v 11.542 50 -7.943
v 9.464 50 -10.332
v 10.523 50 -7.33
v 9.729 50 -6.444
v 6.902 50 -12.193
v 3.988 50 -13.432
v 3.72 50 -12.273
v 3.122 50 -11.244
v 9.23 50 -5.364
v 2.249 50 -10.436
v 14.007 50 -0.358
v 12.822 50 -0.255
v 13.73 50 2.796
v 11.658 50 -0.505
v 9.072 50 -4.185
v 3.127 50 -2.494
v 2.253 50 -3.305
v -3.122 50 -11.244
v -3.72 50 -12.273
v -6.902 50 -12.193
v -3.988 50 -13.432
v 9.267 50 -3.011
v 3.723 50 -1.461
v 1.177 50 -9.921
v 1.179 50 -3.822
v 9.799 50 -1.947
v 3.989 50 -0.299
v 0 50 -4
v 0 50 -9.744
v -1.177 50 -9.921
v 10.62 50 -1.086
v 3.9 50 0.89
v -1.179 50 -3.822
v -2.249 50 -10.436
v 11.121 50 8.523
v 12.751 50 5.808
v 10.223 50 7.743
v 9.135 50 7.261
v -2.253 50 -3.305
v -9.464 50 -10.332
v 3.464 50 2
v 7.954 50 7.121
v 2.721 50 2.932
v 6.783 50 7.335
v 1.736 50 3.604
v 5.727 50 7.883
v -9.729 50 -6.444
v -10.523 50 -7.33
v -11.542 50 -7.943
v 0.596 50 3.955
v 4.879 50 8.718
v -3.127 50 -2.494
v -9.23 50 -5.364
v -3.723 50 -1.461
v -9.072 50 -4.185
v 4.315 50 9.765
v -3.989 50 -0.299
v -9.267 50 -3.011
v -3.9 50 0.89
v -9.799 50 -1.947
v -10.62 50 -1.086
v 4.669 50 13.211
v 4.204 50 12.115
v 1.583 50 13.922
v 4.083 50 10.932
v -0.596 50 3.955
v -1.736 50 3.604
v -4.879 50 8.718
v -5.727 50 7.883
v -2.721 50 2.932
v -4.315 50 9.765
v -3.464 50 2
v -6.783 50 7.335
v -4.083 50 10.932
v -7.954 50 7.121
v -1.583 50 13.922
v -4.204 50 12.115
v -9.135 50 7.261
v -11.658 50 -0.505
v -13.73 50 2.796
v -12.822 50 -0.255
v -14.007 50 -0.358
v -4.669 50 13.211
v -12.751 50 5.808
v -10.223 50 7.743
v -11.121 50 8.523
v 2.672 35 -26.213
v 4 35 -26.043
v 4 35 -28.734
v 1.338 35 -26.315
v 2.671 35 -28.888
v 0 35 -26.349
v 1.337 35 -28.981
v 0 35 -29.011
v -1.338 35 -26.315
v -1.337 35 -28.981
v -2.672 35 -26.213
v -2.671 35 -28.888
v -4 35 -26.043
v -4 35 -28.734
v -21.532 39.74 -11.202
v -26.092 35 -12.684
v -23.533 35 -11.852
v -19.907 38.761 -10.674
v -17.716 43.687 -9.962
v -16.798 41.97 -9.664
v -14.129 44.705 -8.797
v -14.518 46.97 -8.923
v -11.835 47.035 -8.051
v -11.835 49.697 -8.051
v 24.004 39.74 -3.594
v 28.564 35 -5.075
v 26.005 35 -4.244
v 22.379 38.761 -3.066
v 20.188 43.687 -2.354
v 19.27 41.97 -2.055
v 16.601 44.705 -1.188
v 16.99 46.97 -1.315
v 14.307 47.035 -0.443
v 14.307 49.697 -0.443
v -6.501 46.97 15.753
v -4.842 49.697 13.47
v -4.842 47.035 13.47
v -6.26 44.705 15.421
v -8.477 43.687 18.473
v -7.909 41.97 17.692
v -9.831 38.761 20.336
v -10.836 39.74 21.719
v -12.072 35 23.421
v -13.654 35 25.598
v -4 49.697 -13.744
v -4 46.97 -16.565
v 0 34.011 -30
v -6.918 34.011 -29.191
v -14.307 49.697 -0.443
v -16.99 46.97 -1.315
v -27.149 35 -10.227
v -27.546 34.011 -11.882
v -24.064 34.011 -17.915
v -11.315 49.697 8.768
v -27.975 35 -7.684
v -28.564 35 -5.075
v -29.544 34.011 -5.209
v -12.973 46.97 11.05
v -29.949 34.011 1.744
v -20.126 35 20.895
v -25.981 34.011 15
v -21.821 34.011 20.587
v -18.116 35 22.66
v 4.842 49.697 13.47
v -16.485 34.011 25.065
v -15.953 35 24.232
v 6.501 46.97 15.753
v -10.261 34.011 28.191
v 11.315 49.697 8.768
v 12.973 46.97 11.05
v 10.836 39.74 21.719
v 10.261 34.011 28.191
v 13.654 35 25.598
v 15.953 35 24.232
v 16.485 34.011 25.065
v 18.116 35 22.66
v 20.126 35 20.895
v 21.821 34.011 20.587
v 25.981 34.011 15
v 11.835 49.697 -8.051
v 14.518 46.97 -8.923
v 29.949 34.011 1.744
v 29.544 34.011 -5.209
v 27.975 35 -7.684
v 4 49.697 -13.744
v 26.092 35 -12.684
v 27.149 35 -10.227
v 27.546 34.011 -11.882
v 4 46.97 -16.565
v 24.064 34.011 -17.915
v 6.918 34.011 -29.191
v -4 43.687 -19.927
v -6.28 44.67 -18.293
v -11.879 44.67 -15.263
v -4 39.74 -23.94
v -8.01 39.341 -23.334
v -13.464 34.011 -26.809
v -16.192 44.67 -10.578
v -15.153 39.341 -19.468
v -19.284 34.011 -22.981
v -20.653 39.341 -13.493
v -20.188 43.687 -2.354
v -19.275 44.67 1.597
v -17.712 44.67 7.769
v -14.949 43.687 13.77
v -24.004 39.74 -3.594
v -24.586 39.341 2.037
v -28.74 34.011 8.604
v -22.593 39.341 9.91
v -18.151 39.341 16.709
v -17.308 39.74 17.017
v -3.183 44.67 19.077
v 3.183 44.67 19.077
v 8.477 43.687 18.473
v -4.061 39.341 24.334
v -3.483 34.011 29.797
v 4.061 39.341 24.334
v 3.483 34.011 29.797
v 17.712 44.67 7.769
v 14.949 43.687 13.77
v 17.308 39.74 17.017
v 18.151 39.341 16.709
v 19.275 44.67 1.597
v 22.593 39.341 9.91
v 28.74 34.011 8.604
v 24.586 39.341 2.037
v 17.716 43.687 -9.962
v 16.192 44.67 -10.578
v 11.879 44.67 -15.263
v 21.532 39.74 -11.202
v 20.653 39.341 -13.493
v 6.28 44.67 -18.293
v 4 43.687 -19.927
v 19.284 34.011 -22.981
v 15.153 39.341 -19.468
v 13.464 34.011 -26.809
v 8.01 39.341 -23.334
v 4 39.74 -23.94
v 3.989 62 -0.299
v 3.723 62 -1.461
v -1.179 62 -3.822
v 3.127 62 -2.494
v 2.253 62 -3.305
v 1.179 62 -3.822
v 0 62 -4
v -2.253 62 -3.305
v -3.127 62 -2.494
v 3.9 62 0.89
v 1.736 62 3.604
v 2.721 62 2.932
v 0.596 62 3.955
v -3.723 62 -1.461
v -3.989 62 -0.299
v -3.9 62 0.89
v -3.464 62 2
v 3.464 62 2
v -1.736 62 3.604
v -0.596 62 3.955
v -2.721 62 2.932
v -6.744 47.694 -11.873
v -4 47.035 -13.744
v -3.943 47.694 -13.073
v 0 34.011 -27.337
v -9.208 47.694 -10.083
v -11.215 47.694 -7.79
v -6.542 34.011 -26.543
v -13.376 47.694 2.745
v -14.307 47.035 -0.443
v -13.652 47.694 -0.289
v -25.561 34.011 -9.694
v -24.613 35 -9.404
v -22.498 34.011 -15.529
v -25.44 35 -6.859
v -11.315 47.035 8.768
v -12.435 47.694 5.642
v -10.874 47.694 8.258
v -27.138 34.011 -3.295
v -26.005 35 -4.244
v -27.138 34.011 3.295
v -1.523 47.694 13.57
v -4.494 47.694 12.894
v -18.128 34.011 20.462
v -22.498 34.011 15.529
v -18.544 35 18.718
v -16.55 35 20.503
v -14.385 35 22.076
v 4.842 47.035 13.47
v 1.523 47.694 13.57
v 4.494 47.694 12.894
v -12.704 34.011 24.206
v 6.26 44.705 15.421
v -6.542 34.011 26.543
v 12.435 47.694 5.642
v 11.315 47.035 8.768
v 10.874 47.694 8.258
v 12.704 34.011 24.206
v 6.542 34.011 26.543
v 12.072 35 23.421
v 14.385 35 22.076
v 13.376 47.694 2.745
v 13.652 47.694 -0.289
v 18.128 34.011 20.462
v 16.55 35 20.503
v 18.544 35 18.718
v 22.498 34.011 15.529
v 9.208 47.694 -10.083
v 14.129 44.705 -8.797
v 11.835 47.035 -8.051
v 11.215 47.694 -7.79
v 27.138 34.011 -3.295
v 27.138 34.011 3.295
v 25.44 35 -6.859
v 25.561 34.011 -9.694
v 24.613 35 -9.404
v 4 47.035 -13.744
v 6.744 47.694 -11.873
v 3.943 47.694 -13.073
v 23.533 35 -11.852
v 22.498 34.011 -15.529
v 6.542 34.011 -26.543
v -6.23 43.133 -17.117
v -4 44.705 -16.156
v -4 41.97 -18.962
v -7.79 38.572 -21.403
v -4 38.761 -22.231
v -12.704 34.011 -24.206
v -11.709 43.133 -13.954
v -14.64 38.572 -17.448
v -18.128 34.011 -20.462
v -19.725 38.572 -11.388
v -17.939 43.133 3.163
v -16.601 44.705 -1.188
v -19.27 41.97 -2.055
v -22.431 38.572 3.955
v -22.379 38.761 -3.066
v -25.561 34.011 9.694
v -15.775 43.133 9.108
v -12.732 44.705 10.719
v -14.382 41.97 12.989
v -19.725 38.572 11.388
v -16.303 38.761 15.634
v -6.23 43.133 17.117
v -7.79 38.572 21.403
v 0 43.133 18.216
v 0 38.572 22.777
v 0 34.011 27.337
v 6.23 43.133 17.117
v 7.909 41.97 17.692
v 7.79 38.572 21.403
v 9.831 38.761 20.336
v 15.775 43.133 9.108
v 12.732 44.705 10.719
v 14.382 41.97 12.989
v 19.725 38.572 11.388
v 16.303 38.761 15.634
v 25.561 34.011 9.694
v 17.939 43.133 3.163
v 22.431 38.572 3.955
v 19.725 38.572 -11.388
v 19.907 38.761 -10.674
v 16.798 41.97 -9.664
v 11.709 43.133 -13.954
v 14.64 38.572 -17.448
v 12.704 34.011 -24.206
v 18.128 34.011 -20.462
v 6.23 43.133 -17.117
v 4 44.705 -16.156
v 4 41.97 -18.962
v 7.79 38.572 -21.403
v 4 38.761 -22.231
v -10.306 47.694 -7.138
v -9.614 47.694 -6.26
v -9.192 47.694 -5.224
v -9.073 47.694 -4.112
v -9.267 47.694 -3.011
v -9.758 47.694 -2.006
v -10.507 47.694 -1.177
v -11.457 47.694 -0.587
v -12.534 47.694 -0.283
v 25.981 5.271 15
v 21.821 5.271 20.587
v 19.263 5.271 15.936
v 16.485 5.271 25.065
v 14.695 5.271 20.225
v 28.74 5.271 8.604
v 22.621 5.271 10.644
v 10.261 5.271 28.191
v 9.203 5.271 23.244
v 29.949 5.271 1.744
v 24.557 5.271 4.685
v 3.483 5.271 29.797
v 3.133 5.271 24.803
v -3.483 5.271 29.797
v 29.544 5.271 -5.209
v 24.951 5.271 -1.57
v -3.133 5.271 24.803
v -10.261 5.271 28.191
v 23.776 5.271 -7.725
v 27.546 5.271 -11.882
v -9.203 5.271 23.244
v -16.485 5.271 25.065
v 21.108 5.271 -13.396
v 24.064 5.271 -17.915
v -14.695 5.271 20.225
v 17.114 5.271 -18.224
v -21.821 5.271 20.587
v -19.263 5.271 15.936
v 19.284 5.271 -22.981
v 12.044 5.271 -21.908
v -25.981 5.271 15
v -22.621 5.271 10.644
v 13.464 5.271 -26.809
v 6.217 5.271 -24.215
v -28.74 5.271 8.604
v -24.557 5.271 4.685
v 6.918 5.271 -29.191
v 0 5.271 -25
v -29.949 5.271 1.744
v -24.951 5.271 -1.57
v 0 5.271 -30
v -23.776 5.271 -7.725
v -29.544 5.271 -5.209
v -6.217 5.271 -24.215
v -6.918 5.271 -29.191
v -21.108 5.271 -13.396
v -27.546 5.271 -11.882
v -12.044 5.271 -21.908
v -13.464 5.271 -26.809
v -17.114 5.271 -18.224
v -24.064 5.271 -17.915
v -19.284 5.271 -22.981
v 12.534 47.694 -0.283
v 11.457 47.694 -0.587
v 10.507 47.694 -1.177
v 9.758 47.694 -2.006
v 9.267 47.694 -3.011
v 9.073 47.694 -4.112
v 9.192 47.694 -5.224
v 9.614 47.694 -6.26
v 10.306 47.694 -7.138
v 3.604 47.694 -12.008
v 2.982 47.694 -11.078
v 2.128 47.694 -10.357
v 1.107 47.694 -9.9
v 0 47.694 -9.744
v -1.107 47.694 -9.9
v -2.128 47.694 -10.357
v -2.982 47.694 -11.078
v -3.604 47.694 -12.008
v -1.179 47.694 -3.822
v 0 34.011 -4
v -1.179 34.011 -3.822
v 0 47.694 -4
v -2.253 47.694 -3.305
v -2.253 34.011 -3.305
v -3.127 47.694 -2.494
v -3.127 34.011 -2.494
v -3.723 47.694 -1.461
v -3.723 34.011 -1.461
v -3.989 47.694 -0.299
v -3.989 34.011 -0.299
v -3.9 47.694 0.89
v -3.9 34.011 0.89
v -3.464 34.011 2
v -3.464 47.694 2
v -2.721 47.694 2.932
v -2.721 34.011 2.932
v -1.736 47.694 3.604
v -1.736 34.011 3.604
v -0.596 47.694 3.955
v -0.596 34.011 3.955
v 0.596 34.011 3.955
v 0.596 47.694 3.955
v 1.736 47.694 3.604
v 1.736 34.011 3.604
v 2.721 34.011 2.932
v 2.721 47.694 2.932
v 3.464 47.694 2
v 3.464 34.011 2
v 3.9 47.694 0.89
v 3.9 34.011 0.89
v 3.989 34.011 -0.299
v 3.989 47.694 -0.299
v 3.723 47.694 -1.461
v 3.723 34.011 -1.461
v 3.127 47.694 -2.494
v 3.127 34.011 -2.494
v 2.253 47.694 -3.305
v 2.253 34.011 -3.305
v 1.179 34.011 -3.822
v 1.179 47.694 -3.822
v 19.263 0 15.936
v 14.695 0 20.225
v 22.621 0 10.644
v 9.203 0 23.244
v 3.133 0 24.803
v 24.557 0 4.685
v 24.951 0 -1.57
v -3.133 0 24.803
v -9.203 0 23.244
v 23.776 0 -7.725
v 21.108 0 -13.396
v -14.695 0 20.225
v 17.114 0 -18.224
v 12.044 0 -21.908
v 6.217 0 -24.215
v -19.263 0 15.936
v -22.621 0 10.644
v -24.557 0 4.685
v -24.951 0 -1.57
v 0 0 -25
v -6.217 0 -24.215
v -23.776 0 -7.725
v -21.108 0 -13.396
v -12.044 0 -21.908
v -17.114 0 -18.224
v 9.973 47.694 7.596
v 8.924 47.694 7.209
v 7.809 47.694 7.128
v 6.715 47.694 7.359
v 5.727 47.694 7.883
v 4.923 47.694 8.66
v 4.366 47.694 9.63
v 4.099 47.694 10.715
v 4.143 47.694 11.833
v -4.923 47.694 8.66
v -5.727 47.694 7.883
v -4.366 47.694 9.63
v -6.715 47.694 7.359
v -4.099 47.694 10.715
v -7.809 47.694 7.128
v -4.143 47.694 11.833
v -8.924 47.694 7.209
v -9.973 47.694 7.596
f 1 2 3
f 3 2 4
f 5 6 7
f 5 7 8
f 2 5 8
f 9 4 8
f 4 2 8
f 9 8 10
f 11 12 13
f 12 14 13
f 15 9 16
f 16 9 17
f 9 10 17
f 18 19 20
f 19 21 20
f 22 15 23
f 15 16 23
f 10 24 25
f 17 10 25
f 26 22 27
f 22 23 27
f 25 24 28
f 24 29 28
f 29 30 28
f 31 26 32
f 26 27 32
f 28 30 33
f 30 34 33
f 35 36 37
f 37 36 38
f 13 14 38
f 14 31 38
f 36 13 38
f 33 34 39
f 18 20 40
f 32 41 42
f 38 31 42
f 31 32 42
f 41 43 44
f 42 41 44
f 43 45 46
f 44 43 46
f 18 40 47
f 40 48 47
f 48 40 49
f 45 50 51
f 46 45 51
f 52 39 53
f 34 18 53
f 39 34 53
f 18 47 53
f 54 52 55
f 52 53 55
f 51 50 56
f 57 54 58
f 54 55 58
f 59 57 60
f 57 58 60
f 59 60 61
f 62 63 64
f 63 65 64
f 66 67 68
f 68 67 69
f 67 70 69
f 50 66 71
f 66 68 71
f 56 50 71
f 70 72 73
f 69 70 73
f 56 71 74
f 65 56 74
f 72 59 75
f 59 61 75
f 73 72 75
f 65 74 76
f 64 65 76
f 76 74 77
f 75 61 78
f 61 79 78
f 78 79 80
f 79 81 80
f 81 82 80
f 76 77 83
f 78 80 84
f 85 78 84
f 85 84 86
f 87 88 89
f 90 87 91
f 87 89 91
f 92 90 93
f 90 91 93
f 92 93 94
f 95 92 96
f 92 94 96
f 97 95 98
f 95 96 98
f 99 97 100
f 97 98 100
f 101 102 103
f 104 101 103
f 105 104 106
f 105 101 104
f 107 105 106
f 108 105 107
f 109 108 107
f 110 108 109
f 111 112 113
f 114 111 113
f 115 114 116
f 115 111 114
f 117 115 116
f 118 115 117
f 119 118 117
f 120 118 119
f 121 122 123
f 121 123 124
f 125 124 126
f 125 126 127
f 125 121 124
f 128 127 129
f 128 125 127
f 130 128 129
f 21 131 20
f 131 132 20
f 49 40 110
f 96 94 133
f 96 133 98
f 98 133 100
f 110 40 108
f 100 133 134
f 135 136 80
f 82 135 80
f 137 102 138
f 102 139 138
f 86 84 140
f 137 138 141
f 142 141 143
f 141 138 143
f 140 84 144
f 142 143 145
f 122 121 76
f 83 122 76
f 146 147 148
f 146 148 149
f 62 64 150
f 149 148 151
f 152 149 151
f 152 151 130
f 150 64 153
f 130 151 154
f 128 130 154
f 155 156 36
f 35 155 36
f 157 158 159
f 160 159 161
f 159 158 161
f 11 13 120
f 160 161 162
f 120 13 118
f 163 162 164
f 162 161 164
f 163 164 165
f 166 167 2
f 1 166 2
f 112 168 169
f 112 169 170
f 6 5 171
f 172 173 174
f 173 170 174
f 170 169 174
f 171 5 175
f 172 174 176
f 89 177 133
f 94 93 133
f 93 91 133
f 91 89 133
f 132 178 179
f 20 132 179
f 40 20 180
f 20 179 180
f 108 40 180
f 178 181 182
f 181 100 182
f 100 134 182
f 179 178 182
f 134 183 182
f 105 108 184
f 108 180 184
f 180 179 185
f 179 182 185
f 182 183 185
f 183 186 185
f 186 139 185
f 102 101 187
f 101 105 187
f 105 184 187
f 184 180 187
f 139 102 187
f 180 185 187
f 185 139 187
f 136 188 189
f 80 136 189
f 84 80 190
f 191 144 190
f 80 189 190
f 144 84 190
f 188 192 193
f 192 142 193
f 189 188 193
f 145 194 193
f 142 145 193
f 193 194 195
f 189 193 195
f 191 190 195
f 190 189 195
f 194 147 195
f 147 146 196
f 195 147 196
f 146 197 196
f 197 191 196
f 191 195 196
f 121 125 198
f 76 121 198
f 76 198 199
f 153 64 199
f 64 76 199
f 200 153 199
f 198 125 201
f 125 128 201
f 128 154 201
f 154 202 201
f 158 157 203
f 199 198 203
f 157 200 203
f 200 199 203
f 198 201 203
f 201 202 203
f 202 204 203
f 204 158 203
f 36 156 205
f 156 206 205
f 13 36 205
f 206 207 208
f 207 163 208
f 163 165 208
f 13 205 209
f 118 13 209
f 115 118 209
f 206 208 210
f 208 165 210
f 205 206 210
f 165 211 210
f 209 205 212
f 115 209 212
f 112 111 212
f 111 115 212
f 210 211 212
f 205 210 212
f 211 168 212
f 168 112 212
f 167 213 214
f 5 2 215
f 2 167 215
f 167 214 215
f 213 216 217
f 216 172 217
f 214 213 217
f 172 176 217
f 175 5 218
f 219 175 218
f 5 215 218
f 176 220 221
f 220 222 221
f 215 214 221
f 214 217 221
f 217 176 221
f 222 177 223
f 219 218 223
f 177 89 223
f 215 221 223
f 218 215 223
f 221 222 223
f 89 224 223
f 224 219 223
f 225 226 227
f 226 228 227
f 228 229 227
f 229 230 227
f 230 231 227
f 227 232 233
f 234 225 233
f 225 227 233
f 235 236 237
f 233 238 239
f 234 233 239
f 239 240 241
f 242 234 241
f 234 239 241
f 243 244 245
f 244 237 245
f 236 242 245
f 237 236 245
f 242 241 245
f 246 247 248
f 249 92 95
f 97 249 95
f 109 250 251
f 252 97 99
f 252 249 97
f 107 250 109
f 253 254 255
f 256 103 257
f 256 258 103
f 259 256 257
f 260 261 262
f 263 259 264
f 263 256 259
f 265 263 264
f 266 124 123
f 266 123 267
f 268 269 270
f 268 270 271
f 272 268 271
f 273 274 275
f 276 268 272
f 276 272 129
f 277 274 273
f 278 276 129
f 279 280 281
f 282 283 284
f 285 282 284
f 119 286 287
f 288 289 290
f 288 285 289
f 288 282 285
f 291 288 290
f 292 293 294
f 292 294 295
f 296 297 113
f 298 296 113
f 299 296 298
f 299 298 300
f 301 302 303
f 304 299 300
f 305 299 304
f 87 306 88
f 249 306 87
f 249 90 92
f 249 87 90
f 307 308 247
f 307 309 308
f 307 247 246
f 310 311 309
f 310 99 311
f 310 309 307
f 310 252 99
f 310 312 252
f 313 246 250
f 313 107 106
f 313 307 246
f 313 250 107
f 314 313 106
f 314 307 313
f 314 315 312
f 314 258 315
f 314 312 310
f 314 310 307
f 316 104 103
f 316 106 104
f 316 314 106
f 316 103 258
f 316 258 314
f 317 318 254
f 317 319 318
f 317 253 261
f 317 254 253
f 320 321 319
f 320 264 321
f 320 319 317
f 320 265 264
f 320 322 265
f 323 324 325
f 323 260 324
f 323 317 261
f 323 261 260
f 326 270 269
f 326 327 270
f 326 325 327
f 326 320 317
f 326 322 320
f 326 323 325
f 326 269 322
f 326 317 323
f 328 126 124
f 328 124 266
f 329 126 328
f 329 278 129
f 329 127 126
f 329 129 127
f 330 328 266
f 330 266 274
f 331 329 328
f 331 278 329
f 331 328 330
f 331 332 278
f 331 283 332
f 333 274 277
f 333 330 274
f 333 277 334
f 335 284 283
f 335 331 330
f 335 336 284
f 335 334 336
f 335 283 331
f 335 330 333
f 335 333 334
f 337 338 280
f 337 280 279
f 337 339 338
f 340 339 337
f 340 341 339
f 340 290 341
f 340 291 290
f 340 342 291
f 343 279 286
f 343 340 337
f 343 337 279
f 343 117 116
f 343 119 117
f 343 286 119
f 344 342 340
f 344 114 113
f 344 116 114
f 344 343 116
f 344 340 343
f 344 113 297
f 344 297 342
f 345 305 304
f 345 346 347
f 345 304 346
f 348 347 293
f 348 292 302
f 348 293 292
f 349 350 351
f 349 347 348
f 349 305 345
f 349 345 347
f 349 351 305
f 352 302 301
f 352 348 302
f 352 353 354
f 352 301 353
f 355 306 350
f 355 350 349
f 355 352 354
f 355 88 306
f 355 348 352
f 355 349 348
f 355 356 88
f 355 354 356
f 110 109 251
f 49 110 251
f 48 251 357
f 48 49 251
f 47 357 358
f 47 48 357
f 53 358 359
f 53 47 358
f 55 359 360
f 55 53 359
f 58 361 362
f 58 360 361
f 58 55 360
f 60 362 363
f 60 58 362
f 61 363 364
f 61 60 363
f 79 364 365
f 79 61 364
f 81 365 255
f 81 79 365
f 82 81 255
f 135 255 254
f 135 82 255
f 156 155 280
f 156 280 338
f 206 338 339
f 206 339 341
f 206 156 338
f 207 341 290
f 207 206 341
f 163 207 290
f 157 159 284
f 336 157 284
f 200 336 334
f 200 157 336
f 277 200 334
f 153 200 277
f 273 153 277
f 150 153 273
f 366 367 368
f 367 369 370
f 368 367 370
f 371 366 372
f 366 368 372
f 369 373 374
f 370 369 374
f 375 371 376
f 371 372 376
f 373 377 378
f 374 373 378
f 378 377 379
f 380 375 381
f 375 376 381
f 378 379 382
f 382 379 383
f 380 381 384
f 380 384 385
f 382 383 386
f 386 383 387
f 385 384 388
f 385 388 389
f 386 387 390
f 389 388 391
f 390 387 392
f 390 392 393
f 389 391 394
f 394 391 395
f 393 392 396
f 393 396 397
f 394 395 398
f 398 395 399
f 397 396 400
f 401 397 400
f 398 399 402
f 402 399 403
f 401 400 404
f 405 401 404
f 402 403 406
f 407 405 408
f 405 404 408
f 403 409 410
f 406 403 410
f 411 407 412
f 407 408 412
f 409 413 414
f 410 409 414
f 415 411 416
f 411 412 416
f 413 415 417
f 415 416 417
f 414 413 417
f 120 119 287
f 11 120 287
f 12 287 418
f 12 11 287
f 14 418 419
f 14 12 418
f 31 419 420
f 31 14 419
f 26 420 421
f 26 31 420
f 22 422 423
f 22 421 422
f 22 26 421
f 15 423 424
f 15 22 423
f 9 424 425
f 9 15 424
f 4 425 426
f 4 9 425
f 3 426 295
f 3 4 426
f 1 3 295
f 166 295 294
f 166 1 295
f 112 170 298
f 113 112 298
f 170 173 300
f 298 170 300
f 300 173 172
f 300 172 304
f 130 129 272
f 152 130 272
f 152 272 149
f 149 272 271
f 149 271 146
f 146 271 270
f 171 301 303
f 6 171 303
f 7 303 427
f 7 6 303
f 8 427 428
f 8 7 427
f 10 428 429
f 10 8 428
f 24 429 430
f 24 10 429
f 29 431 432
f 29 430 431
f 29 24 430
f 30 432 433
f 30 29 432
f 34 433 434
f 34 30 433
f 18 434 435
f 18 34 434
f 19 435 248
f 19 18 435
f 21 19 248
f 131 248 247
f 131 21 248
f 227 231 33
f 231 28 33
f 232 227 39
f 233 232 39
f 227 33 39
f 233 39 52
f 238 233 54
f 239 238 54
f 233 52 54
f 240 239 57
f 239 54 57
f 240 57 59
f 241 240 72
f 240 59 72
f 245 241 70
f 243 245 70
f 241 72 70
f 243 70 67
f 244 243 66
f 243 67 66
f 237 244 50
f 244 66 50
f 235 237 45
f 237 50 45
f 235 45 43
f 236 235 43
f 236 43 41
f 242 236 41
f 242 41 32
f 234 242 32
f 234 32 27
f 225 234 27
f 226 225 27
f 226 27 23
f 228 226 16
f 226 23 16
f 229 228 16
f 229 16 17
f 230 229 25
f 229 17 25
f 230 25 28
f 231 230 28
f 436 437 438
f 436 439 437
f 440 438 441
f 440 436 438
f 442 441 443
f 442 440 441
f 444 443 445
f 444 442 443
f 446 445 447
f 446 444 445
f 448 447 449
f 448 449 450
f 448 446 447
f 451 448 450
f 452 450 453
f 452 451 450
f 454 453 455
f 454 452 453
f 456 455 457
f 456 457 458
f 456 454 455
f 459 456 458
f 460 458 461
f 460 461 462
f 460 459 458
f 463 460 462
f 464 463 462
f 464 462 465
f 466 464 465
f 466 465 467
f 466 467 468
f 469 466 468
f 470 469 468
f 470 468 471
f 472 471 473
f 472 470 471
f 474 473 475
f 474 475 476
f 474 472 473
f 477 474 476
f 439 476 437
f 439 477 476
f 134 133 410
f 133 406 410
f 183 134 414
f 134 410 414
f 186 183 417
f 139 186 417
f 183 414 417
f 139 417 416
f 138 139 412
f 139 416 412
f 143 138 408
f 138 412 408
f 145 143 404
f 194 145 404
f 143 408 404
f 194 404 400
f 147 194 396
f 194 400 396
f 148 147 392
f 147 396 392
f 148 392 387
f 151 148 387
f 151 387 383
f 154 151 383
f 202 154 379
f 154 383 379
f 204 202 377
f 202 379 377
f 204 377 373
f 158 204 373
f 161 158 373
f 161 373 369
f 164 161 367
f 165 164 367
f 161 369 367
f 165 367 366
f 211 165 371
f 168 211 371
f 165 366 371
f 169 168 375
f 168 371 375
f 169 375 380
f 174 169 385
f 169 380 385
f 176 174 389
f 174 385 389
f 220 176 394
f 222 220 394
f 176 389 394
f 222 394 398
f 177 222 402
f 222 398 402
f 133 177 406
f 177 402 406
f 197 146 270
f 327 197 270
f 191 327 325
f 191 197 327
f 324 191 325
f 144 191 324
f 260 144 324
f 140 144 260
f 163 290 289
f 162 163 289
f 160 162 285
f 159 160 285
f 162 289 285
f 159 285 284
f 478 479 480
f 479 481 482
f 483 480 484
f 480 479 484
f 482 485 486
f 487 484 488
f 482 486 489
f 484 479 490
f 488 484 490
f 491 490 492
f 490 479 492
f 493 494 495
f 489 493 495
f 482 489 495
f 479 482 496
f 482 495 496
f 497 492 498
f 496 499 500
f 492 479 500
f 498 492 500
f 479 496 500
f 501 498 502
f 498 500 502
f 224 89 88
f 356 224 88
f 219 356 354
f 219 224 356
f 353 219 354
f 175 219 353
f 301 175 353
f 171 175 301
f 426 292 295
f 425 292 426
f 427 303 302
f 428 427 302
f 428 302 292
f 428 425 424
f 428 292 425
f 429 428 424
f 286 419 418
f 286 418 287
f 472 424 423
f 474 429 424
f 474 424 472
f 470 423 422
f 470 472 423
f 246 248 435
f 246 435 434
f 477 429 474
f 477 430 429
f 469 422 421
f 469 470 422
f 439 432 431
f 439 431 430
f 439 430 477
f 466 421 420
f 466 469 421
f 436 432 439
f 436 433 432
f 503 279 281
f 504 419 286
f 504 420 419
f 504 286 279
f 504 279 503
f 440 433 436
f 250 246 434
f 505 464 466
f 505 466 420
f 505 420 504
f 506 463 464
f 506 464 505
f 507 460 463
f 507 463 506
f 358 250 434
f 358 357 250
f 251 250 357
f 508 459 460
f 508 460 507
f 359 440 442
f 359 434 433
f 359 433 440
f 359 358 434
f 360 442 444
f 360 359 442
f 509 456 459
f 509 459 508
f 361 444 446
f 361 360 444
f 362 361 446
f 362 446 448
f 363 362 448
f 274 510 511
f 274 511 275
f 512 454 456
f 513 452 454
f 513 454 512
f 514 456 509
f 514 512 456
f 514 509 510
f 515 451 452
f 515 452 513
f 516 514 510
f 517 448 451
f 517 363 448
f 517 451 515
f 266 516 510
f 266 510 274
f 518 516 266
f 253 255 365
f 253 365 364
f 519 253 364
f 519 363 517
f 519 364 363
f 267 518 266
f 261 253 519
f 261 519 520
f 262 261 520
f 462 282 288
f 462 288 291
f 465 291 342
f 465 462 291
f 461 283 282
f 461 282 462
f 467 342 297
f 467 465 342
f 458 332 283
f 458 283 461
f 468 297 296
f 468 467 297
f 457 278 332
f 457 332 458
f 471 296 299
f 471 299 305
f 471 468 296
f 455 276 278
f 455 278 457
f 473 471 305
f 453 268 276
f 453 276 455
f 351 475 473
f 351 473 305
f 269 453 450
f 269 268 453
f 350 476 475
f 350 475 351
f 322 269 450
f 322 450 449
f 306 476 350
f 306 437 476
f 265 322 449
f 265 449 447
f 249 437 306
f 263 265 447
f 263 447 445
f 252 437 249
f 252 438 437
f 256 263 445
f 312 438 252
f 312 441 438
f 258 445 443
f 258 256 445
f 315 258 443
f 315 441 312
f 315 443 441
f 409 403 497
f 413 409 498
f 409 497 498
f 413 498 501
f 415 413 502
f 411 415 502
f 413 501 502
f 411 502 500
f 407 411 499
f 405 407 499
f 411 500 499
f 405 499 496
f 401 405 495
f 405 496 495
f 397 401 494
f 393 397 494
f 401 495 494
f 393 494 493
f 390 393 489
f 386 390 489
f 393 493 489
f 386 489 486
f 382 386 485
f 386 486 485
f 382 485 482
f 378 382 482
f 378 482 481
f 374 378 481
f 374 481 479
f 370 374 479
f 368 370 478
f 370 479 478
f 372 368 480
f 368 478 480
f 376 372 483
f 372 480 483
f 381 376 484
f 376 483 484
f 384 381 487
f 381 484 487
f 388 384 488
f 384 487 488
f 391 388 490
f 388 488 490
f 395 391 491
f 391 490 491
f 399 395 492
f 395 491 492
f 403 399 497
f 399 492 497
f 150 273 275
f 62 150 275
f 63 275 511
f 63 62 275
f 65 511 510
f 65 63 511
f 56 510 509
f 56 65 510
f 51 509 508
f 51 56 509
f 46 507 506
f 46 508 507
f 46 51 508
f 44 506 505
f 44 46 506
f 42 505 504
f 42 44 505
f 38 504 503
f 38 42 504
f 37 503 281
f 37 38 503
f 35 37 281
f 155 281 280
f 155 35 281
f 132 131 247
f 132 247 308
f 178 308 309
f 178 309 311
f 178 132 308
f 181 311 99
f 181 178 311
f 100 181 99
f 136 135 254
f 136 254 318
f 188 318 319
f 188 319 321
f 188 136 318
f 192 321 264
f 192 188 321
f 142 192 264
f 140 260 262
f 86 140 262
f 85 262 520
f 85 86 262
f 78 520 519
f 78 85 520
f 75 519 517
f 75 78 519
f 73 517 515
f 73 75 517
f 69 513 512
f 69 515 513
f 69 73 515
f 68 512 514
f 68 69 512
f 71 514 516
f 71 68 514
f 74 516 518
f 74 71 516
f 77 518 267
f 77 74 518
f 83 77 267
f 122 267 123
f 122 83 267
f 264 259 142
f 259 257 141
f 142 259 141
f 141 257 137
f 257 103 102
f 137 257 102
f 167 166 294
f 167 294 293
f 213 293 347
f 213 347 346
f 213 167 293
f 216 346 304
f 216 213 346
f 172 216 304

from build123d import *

# Parameters (mm, degrees)
CUT_EXTRUDE1_DEPTH = 15


with BuildPart() as part:
    # Sketch1 → Revolve1 (revolve)
    with BuildSketch(Plane.XY, mode=Mode.PRIVATE) as revolve1_sk:
        Polygon((0, 0), (0, 62), (4, 62), (4, 50), (14.011376117, 50), (30, 34.011376117), (30, 5.271229558), (25, 5.271229558), (25, 0), align=None)
        Polygon((4, 47.694049141), (13.654762603, 47.694049141), (27.337435628, 34.011376117), (4, 34.011376117), align=None, mode=Mode.SUBTRACT)
    revolve(revolve1_sk.sketch.rotate(Axis((0, 0, 0), (0, 1, 0)), 90), axis=Axis((0, 0, 0), (0, 1, 0)))

    # Sketch2 → Cut-Extrude1 (cut)
    with BuildSketch(Plane(origin=(0, 50, 0), x_dir=(1, 0, 0), z_dir=(0, 1, 0))):
        with BuildLine():
            Line((-4, 13.743876759), (-4, 37.242755883))
            Line((-4, 37.242755883), (4, 37.242755883))
            Line((4, 37.242755883), (4, 13.743876759))
            ThreePointArc((4, 13.743876759), (0, 9.743876759), (-4, 13.743876759))
        make_face()
        with BuildLine():
            Line((11.835135573, 8.051317552), (34.18389769, 15.312870551))
            Line((34.18389769, 15.312870551), (36.656033645, 7.70441842))
            Line((36.656033645, 7.70441842), (14.307271528, 0.442865422))
            ThreePointArc((14.307271528, 0.442865422), (9.266977486, 3.01102351), (11.835135573, 8.051317552))
        make_face()
        with BuildLine():
            Line((11.314516046, -8.767888857), (25.126810641, -27.778881418))
            Line((25.126810641, -27.778881418), (18.654674686, -32.481163436))
            Line((18.654674686, -32.481163436), (4.842380091, -13.470170876))
            ThreePointArc((4.842380091, -13.470170876), (5.727307059, -7.882961889), (11.314516046, -8.767888857))
        make_face()
        with BuildLine():
            Line((-4.842380091, -13.470170876), (-18.654674686, -32.481163436))
            Line((-18.654674686, -32.481163436), (-25.126810641, -27.778881418))
            Line((-25.126810641, -27.778881418), (-11.314516046, -8.767888857))
            ThreePointArc((-11.314516046, -8.767888857), (-5.727307059, -7.882961889), (-4.842380091, -13.470170876))
        make_face()
        with BuildLine():
            Line((-14.307271528, 0.442865422), (-36.656033645, 7.70441842))
            Line((-36.656033645, 7.70441842), (-34.18389769, 15.312870551))
            Line((-34.18389769, 15.312870551), (-11.835135573, 8.051317552))
            ThreePointArc((-11.835135573, 8.051317552), (-9.266977486, 3.01102351), (-14.307271528, 0.442865422))
        make_face()
    extrude(amount=-CUT_EXTRUDE1_DEPTH, mode=Mode.SUBTRACT)


solid = part.part
